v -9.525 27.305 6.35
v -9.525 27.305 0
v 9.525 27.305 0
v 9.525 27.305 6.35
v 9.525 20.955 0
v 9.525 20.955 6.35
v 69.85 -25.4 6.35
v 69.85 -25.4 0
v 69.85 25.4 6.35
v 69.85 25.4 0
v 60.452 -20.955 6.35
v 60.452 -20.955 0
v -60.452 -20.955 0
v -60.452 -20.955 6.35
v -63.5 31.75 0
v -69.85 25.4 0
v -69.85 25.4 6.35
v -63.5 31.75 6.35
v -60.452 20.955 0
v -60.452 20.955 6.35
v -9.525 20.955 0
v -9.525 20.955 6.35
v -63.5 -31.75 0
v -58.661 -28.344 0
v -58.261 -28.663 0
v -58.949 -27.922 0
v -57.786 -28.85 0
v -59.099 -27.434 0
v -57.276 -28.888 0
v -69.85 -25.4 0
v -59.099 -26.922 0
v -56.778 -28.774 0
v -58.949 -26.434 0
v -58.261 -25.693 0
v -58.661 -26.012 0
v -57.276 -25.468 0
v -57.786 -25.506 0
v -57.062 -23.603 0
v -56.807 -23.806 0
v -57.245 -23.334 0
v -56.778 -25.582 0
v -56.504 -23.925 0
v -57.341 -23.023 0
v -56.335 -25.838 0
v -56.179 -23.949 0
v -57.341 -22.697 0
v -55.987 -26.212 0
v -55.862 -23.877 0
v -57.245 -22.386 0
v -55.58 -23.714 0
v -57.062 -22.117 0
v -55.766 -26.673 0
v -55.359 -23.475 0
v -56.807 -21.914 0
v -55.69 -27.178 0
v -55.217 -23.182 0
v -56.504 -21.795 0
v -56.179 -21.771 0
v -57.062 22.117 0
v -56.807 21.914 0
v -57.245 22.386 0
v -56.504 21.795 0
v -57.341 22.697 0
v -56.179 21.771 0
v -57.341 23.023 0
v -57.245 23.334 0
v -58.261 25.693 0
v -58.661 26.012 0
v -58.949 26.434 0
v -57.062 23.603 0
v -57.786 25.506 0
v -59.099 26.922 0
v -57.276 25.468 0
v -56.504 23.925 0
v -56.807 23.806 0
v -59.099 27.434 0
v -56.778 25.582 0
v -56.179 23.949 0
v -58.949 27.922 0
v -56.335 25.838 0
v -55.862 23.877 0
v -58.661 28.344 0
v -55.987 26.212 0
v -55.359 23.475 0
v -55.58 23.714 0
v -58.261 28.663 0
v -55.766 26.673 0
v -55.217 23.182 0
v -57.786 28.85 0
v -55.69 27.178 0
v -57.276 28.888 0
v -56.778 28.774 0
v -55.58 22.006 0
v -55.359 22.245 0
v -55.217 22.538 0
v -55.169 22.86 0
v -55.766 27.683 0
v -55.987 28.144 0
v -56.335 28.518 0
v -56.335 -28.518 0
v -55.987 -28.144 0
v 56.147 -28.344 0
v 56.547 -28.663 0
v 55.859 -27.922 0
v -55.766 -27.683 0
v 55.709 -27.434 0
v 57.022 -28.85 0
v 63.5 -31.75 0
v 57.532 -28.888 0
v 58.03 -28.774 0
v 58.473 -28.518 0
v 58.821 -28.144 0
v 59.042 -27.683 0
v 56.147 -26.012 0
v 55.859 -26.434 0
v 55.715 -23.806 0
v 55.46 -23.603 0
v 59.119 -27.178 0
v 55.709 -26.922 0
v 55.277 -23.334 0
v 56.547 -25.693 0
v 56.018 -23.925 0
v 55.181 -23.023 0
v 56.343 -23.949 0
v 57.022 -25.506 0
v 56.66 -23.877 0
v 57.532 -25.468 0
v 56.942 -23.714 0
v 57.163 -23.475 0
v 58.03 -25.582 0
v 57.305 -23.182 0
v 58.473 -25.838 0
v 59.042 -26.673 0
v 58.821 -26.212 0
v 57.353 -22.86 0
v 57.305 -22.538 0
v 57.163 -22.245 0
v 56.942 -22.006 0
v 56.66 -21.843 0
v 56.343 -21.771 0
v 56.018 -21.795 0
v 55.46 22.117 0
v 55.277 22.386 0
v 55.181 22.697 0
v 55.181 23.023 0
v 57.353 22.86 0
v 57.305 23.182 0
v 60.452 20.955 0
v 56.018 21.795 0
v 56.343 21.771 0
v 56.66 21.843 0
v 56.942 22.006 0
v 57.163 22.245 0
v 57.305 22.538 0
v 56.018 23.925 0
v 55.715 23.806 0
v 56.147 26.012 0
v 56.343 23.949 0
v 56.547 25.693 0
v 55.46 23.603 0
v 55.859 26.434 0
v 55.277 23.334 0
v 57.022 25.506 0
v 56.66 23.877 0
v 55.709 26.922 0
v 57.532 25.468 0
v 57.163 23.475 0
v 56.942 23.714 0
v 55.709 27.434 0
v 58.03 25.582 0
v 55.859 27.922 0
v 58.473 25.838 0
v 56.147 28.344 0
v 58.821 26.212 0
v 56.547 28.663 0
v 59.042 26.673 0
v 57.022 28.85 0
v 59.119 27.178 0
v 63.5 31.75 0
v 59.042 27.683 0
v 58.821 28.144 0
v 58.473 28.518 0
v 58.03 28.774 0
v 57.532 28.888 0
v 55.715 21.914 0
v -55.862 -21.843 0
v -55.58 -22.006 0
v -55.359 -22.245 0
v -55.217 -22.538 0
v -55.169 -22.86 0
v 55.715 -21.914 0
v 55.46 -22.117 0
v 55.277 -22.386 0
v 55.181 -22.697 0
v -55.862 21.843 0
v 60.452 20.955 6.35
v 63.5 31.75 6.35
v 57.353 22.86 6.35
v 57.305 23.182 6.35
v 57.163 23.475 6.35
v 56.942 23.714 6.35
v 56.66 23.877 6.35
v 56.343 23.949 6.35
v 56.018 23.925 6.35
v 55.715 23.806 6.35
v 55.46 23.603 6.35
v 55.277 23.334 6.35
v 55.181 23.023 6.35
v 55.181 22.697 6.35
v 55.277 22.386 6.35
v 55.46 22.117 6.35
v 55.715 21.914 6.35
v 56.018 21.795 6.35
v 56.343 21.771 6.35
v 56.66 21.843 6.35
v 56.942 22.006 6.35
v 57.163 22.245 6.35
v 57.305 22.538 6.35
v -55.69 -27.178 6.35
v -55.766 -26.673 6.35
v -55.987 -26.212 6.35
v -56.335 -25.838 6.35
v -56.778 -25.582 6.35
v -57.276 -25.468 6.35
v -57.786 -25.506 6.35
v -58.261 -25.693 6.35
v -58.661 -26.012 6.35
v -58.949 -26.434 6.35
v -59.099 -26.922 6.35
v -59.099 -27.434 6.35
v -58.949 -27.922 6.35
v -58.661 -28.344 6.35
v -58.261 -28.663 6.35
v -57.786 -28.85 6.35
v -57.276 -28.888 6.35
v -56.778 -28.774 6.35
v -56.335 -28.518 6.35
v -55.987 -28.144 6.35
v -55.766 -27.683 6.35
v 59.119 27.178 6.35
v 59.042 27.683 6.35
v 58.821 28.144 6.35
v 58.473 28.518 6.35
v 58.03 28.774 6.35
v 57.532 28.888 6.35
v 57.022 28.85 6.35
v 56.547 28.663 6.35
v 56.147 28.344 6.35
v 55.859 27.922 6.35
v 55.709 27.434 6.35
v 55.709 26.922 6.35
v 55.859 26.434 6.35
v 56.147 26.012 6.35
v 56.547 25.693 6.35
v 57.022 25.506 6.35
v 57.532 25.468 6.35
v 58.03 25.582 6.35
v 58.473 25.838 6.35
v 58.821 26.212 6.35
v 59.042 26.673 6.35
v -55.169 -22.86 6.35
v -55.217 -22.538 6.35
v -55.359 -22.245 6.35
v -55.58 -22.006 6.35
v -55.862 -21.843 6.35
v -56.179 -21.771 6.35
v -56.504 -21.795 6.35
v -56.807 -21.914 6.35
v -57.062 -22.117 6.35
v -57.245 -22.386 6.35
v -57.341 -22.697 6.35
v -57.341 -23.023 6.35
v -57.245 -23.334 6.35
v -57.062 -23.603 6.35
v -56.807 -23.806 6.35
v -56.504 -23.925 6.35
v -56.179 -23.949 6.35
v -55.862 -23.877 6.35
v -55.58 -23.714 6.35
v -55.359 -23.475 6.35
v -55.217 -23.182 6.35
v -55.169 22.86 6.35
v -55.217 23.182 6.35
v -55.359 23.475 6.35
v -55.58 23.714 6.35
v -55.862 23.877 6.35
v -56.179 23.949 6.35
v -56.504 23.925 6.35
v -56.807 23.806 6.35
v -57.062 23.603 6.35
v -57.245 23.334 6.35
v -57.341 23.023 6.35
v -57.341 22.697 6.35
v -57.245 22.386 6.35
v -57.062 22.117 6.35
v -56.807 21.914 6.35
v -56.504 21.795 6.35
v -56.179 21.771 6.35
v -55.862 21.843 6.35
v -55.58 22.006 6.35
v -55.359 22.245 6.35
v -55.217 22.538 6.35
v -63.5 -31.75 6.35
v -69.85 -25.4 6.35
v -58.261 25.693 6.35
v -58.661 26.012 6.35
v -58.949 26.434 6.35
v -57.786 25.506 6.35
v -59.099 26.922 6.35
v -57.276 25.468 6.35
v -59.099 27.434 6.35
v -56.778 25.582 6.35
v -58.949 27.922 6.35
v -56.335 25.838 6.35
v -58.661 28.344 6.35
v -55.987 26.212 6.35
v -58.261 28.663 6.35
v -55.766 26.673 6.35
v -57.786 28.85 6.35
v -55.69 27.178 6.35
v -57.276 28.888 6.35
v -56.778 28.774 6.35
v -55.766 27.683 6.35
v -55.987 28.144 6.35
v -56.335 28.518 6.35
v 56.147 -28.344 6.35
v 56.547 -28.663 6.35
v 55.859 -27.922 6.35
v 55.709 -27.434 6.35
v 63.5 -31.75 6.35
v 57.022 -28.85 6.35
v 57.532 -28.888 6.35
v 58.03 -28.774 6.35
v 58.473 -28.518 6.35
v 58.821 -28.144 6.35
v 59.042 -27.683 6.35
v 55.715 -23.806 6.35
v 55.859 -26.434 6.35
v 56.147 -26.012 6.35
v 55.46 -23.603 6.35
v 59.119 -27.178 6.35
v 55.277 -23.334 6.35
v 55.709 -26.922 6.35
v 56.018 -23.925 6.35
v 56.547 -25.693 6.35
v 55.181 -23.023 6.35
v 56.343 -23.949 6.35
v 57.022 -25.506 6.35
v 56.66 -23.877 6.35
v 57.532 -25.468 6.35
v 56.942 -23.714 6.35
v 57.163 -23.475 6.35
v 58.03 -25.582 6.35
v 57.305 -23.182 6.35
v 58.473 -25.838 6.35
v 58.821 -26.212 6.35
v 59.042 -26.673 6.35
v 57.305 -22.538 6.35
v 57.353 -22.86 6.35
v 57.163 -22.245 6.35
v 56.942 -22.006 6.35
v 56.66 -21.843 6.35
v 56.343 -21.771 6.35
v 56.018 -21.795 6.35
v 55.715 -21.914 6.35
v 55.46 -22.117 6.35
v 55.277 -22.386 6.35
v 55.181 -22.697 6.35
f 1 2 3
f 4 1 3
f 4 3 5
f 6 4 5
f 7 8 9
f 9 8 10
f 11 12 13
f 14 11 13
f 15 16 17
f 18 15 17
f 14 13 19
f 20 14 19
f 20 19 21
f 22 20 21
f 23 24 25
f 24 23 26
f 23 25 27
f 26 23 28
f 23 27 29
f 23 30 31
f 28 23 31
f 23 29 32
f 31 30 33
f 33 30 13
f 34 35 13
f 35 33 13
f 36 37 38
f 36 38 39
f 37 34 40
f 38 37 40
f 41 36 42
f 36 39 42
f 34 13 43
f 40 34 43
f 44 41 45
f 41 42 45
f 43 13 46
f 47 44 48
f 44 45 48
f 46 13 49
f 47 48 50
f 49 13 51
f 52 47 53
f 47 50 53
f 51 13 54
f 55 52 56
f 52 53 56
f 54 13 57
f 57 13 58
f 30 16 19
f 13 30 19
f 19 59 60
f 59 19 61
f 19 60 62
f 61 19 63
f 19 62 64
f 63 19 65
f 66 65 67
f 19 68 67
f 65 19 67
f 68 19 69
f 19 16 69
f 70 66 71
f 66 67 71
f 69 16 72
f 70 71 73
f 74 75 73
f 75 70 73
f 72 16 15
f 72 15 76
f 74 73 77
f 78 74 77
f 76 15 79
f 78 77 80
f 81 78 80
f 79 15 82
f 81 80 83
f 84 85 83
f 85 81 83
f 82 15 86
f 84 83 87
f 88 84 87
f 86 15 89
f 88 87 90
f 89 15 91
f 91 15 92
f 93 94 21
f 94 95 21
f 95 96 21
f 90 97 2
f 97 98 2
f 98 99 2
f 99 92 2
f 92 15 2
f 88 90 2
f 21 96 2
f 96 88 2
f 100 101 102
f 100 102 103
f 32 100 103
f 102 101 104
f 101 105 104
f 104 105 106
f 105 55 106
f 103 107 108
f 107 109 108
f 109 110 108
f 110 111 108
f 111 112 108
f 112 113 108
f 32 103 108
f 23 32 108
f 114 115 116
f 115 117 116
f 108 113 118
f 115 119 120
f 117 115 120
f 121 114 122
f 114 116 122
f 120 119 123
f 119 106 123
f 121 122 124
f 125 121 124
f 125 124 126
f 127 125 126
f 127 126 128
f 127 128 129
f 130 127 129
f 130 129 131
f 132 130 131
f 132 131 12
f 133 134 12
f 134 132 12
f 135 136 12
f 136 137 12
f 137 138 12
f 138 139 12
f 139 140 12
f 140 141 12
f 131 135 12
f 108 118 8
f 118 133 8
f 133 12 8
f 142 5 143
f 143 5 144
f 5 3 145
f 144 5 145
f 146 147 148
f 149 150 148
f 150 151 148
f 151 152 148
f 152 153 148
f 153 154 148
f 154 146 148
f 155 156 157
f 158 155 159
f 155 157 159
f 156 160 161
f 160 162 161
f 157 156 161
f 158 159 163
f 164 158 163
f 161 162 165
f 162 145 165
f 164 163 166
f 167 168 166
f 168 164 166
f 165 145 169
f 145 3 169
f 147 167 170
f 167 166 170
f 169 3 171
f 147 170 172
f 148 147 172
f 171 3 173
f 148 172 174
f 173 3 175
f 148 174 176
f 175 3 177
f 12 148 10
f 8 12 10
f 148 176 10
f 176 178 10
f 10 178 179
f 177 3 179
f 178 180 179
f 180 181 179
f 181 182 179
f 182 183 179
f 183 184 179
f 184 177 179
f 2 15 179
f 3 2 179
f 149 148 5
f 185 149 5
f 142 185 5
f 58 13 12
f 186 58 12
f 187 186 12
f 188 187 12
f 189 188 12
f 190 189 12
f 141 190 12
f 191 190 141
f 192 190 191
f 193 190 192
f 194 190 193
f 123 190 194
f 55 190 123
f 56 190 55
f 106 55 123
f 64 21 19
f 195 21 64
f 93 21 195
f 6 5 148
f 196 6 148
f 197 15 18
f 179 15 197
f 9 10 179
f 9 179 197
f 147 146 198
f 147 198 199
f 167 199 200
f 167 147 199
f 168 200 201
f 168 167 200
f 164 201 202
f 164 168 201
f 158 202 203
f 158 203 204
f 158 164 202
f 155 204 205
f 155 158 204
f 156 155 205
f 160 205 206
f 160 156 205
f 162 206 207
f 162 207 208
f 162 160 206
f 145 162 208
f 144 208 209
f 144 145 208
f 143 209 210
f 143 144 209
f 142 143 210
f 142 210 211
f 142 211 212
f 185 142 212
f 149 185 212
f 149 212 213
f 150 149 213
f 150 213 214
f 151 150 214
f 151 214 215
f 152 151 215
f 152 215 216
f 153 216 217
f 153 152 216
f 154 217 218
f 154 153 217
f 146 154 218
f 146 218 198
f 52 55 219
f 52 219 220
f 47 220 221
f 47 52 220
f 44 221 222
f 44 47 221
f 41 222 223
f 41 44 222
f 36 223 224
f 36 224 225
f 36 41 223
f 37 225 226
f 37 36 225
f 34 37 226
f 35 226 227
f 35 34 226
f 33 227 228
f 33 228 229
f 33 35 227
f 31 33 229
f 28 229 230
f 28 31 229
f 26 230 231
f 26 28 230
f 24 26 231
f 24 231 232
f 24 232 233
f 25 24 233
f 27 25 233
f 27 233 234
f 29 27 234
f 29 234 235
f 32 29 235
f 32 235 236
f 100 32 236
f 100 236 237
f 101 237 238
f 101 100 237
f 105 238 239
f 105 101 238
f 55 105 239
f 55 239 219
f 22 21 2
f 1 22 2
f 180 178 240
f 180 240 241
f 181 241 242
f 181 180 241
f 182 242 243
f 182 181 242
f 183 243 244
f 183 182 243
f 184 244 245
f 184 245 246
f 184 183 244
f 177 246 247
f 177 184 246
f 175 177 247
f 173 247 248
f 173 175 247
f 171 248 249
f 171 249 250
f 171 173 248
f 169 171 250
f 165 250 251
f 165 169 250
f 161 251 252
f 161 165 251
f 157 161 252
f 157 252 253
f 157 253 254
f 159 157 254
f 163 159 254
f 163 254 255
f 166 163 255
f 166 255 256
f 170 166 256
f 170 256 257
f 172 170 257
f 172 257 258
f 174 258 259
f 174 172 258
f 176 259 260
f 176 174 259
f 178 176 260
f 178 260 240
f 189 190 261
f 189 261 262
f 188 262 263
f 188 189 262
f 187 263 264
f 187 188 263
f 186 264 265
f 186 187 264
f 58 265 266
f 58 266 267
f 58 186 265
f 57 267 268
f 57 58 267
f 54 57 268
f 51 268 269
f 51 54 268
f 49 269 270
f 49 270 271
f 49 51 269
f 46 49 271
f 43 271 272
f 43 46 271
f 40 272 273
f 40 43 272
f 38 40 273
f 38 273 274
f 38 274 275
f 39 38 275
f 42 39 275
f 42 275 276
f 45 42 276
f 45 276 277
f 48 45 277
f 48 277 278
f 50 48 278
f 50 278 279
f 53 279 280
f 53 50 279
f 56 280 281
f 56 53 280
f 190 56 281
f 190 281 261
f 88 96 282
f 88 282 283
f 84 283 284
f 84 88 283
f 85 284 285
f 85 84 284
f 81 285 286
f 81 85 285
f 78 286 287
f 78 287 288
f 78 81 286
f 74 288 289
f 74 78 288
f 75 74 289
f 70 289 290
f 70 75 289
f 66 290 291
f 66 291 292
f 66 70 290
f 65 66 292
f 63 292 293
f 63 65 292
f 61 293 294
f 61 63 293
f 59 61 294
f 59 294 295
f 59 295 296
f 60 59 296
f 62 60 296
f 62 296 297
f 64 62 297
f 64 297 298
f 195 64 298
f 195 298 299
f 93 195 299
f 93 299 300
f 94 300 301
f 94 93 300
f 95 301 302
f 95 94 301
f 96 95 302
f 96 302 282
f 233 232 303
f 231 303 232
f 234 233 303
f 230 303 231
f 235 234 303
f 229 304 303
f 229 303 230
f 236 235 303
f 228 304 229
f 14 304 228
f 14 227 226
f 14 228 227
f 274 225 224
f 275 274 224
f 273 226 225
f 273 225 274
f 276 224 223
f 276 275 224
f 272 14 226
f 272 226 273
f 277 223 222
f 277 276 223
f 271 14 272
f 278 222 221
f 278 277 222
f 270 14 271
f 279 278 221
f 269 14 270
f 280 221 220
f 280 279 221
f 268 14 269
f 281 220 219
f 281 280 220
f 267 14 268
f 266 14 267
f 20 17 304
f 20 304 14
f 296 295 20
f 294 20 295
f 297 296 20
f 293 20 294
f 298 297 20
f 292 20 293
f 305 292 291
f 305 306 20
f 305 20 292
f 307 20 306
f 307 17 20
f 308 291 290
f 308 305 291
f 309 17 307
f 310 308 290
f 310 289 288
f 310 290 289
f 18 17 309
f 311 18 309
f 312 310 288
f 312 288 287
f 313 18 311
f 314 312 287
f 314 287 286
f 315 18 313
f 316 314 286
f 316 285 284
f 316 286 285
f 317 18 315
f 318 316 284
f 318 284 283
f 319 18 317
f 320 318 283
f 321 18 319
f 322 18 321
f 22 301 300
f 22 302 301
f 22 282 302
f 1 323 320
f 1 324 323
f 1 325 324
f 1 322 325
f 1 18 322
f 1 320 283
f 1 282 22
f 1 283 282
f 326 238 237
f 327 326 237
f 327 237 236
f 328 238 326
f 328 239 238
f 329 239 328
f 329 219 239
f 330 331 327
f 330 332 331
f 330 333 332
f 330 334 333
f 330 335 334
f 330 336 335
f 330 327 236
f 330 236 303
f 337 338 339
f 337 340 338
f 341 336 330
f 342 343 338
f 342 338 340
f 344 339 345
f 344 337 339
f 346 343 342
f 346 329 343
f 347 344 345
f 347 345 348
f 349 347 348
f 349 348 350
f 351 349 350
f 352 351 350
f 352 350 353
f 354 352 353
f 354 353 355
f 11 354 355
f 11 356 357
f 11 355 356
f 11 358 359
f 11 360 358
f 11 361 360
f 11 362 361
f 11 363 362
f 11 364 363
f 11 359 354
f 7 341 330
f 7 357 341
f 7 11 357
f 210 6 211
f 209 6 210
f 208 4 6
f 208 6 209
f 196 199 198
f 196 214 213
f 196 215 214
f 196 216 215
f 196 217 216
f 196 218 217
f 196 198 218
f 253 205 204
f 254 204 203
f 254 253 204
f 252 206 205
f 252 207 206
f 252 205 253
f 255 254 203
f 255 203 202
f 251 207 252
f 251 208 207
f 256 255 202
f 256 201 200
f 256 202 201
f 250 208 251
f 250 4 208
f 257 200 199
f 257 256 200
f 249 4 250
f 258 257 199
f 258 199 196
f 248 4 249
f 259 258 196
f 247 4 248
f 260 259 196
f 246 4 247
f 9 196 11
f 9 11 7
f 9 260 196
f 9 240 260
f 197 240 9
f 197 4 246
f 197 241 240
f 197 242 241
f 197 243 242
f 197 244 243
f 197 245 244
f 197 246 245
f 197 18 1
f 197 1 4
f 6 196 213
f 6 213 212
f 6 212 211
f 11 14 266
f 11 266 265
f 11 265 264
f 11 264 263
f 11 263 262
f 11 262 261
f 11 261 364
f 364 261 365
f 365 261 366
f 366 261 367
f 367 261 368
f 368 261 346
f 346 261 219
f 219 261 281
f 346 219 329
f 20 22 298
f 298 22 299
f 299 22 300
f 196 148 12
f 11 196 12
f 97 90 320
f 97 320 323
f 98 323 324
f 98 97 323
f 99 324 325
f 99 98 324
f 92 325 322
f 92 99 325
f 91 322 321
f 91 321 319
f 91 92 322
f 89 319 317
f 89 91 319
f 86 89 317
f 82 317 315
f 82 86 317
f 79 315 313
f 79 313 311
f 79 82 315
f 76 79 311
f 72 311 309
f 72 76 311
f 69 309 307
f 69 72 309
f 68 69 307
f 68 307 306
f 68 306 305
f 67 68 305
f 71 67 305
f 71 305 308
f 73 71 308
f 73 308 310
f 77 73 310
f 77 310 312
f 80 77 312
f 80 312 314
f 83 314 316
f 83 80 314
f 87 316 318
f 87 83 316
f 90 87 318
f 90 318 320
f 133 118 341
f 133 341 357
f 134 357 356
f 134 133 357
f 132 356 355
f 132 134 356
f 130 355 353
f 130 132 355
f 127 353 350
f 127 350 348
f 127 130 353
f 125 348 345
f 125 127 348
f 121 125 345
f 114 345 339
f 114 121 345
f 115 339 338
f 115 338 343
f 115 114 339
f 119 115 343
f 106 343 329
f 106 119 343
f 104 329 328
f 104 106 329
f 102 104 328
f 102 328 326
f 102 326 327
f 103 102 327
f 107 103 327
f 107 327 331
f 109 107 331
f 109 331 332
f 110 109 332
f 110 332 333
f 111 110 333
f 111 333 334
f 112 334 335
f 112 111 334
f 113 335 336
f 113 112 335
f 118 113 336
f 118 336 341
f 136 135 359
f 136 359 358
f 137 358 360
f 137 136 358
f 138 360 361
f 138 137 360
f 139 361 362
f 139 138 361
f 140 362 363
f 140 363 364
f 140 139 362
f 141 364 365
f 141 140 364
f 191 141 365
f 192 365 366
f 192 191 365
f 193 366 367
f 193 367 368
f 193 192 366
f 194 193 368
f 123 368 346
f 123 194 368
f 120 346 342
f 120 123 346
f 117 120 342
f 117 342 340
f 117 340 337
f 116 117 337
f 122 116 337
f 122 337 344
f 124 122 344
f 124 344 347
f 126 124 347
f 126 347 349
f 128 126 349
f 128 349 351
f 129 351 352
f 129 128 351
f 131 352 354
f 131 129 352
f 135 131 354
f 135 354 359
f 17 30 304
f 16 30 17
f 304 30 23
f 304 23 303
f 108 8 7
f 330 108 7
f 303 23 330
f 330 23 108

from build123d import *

# Parameters (mm, degrees)
F0_W     = 139.7
F0_H     = 63.5
F0_R     = 1.7145
F0_R_2   = 1.0922
F1_DEPTH = 6.35
F2_SIZE  = 6.35


with BuildPart() as f1:
    # F0 (on Top) → F1 (new body)
    with BuildSketch(Plane.XY):
        Rectangle(F0_W, F0_H)
        with Locations((-57.404, -27.178)):
            Circle(F0_R, mode=Mode.SUBTRACT)
        with Locations((-56.261, -22.86)):
            Circle(F0_R_2, mode=Mode.SUBTRACT)
        with Locations((57.404, -27.178)):
            Circle(F0_R, mode=Mode.SUBTRACT)
        with Locations((56.261, -22.86)):
            Circle(F0_R_2, mode=Mode.SUBTRACT)
        with Locations((-56.261, 22.86)):
            Circle(F0_R_2, mode=Mode.SUBTRACT)
        with Locations((-57.404, 27.178)):
            Circle(F0_R, mode=Mode.SUBTRACT)
        Polygon((9.525, 20.955), (60.452, 20.955), (60.452, -20.955), (-60.452, -20.955), (-60.452, 20.955), (-9.525, 20.955), (-9.525, 27.305), (9.525, 27.305), align=None, mode=Mode.SUBTRACT)
        with Locations((56.261, 22.86)):
            Circle(F0_R_2, mode=Mode.SUBTRACT)
        with Locations((57.404, 27.178)):
            Circle(F0_R, mode=Mode.SUBTRACT)
    extrude(amount=F1_DEPTH)

    # F2
    f2_edges = [f1.edges().sort_by_distance(p)[0] for p in [
        (-69.85, -31.75, 3.175),
        (69.85, 31.75, 3.175),
        (-69.85, 31.75, 3.175),
        (69.85, -31.75, 3.175),
    ]]
    chamfer(f2_edges, length=F2_SIZE)


solid = f1.part
